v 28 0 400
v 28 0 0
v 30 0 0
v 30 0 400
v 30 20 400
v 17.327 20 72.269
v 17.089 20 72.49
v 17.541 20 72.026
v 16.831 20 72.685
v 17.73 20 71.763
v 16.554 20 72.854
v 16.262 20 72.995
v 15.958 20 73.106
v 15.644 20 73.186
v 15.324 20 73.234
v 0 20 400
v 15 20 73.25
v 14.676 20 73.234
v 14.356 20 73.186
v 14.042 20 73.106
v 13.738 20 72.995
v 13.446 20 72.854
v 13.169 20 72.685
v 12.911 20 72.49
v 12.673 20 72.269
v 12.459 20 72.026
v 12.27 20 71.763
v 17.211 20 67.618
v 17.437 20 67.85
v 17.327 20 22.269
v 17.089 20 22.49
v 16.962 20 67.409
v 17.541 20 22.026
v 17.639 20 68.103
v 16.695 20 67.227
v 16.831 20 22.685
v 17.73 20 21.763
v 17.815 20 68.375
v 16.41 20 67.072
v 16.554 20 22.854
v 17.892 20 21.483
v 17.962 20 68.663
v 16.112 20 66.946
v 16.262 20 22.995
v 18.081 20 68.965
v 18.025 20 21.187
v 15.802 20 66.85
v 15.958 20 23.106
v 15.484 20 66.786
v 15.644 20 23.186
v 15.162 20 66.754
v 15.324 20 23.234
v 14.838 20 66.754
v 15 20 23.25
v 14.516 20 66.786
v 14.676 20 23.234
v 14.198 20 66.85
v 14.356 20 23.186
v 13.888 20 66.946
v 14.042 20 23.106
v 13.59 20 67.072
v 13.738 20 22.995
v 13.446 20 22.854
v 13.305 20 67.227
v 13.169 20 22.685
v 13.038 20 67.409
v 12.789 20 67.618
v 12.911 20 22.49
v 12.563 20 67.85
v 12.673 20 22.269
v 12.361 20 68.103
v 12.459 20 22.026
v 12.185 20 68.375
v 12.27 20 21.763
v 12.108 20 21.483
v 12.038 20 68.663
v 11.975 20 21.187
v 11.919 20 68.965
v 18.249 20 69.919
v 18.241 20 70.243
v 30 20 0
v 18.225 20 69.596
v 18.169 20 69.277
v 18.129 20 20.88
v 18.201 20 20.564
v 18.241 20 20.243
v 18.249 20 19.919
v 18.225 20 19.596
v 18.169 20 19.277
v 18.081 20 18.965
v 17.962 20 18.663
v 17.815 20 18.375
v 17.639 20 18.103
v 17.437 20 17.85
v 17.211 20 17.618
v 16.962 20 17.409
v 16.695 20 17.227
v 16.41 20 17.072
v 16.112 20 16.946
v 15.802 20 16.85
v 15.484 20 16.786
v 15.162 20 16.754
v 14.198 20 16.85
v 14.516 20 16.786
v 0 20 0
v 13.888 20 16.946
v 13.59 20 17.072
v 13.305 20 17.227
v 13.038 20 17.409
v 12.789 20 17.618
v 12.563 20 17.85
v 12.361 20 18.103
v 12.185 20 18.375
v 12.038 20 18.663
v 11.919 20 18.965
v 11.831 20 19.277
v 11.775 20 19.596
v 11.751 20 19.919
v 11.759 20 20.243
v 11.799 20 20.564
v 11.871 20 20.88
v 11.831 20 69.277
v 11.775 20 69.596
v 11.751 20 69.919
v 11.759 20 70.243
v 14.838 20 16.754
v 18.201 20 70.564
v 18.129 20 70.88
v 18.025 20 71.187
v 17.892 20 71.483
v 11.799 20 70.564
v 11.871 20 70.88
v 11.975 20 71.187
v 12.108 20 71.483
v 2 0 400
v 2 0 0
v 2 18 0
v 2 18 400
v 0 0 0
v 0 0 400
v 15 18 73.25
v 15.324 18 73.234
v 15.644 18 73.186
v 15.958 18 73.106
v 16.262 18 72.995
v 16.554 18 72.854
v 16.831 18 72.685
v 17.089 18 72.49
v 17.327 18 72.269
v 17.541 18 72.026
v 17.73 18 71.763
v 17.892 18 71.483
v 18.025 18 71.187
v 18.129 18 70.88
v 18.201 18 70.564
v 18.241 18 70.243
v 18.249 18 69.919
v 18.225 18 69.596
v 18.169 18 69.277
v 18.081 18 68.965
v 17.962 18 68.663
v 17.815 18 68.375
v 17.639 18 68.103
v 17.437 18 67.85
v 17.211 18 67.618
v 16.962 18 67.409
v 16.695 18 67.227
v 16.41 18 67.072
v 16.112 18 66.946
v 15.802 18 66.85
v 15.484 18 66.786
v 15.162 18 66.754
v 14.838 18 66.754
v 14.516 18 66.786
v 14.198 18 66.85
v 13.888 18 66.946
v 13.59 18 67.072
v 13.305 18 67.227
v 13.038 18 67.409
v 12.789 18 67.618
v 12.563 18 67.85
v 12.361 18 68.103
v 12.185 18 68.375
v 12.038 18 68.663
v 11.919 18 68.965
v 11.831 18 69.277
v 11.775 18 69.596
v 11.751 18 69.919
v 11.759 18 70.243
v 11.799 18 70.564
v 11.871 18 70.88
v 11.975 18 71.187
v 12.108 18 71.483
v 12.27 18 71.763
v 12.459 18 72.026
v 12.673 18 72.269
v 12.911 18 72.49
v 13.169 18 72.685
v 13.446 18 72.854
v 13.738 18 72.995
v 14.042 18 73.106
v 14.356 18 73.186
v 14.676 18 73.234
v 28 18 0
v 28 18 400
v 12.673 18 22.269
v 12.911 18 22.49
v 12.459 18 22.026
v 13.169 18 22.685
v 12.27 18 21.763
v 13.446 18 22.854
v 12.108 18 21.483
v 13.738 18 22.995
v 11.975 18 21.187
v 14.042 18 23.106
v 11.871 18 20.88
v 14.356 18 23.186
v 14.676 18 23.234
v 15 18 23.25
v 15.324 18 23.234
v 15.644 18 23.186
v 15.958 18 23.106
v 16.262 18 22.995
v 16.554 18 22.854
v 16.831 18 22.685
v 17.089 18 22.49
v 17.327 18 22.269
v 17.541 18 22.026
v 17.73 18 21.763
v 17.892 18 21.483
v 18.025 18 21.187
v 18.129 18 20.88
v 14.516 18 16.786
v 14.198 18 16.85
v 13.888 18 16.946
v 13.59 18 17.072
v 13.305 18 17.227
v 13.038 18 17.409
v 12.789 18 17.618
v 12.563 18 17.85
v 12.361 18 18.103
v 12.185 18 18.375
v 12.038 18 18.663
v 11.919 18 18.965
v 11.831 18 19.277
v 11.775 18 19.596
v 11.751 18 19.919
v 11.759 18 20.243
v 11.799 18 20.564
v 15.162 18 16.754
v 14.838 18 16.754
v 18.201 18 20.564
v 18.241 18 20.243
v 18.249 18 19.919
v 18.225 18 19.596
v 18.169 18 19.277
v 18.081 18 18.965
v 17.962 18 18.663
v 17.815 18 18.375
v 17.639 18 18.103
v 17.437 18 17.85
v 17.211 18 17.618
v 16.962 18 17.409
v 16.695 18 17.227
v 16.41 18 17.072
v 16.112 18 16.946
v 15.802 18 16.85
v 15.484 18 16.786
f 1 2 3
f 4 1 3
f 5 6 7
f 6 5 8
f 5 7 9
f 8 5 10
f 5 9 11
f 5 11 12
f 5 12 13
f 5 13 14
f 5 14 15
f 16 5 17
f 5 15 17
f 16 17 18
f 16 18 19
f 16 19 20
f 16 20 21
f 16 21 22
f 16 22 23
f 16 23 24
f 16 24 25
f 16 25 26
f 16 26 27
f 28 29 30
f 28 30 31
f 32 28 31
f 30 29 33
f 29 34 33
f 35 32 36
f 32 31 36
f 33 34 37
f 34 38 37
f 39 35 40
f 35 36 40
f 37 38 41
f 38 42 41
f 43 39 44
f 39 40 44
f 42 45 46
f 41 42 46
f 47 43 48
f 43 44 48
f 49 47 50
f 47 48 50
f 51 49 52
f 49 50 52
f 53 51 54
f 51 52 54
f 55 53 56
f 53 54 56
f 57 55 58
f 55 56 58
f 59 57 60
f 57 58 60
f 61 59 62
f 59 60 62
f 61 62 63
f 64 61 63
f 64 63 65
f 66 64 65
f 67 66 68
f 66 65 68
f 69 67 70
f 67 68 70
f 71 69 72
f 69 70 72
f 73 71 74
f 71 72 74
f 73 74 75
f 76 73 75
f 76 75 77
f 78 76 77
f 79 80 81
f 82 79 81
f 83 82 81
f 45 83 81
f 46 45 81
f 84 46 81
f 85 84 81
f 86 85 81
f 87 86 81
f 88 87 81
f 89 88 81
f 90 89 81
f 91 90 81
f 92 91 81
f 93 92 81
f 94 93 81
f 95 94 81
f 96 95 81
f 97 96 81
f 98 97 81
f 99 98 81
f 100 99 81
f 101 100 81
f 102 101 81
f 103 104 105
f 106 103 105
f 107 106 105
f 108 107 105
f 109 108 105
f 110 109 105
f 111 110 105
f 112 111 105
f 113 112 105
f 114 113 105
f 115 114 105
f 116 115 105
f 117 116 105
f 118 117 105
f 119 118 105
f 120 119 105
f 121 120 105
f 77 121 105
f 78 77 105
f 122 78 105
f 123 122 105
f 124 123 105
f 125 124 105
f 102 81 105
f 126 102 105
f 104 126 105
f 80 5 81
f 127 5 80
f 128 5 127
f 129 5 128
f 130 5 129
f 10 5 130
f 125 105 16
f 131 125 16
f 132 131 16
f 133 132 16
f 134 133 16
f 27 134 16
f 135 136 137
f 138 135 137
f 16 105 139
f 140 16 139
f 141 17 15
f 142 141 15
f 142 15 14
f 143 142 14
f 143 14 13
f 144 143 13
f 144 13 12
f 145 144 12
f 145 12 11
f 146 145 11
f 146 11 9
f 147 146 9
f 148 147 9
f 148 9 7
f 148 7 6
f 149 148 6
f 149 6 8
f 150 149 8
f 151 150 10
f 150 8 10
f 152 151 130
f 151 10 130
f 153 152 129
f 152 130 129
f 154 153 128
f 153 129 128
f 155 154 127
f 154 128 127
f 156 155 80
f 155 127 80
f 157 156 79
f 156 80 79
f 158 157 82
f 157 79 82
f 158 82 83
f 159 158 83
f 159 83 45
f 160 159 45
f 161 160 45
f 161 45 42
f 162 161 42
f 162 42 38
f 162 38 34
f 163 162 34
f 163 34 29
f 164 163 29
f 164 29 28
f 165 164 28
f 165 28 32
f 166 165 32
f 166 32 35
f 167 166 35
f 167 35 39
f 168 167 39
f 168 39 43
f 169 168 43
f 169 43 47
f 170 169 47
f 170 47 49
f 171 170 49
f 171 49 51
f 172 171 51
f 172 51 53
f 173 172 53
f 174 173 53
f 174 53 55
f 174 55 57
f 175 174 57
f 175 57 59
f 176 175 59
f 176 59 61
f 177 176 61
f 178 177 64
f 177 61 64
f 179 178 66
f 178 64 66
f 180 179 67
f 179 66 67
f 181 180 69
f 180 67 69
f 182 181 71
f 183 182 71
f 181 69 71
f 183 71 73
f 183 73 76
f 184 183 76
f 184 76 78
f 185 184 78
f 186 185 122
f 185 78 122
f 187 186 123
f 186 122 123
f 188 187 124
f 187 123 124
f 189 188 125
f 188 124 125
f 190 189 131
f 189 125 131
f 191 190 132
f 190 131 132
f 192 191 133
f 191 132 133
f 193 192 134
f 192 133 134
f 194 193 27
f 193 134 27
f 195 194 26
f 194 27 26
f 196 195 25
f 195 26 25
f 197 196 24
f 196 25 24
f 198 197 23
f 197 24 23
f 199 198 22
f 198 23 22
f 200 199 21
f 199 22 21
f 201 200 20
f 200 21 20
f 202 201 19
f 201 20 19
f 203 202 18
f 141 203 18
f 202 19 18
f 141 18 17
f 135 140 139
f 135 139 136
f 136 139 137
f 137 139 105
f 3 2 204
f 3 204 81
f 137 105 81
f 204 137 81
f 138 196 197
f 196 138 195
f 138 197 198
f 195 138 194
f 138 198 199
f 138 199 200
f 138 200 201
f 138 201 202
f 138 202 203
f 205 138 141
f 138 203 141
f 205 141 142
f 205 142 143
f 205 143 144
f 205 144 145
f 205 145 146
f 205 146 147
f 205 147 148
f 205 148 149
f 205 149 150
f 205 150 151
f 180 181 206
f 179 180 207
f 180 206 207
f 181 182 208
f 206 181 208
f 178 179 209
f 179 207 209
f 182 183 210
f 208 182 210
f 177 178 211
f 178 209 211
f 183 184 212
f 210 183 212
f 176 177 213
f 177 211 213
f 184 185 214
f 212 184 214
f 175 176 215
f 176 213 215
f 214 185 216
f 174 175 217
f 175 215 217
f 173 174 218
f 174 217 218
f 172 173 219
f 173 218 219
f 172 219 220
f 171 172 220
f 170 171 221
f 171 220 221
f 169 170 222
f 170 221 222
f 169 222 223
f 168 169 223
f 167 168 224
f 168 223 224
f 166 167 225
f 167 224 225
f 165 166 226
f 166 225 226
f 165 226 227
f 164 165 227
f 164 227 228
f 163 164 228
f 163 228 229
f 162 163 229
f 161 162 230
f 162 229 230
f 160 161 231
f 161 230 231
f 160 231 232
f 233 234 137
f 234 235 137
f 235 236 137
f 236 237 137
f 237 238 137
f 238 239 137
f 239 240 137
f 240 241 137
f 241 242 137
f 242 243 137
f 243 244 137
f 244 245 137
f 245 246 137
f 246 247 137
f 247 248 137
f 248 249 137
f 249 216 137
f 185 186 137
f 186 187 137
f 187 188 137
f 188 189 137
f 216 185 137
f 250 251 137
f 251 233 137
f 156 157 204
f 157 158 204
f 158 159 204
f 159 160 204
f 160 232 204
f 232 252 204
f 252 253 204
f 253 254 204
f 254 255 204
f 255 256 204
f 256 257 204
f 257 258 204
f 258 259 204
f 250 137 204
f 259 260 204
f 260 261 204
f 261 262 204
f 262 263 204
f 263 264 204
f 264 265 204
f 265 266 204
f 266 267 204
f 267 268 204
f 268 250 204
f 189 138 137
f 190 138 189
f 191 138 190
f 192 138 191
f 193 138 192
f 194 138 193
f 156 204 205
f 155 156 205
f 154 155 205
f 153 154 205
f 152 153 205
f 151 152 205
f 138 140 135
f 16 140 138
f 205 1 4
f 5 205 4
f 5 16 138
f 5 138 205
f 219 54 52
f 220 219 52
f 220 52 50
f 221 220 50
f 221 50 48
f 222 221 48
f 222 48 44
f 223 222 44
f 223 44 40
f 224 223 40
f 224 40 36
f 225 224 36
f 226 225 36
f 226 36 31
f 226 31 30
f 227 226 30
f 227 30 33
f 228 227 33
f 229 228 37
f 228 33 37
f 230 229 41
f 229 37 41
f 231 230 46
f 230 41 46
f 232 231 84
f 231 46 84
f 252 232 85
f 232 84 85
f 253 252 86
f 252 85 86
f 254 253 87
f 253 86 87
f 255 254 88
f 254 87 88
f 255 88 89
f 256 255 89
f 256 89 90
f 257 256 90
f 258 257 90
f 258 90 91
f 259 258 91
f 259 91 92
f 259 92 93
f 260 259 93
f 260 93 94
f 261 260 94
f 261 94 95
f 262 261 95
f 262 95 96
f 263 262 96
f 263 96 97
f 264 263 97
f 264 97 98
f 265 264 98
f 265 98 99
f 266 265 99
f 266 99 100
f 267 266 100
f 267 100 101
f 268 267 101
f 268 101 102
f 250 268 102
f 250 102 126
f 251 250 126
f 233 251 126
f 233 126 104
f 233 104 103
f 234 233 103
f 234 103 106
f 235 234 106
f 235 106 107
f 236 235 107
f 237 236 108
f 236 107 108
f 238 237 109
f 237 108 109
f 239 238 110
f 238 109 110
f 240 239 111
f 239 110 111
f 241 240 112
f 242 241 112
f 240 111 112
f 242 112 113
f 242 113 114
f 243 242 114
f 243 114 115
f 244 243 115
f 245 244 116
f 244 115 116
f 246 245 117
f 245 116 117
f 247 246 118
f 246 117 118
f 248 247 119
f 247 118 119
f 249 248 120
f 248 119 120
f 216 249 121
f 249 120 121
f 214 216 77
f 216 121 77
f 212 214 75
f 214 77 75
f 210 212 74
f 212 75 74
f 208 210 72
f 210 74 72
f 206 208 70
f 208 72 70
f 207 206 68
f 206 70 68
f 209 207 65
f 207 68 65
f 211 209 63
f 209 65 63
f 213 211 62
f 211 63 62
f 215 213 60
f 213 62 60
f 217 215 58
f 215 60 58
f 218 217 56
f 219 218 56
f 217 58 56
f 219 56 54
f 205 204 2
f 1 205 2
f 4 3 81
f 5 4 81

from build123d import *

# Parameters (mm, degrees)
BOSS_EXTRUDE1_DEPTH = 400
SKETCH2_R           = 3.25
CUT_EXTRUDE1_DEPTH  = 300


with BuildPart() as part:
    # Sketch1 → Boss-Extrude1 (new body)
    with BuildSketch(Plane.XY):
        Polygon((28, 0), (30, 0), (30, 20), (0, 20), (0, 0), (2, 0), (2, 18), (28, 18), align=None)
    extrude(amount=BOSS_EXTRUDE1_DEPTH)

    # Sketch2 → Cut-Extrude1 (cut)
    with BuildSketch(Plane(origin=(0, 20, 0), x_dir=(1, 0, 0), z_dir=(0, 1, 0))):
        with Locations(Location((15, -70, 0), (0, 0, 270))):
            Circle(SKETCH2_R)
        with Locations(Location((15, -20, 0), (0, 0, 270))):
            Circle(SKETCH2_R)
    extrude(amount=-CUT_EXTRUDE1_DEPTH, mode=Mode.SUBTRACT)


solid = part.part
